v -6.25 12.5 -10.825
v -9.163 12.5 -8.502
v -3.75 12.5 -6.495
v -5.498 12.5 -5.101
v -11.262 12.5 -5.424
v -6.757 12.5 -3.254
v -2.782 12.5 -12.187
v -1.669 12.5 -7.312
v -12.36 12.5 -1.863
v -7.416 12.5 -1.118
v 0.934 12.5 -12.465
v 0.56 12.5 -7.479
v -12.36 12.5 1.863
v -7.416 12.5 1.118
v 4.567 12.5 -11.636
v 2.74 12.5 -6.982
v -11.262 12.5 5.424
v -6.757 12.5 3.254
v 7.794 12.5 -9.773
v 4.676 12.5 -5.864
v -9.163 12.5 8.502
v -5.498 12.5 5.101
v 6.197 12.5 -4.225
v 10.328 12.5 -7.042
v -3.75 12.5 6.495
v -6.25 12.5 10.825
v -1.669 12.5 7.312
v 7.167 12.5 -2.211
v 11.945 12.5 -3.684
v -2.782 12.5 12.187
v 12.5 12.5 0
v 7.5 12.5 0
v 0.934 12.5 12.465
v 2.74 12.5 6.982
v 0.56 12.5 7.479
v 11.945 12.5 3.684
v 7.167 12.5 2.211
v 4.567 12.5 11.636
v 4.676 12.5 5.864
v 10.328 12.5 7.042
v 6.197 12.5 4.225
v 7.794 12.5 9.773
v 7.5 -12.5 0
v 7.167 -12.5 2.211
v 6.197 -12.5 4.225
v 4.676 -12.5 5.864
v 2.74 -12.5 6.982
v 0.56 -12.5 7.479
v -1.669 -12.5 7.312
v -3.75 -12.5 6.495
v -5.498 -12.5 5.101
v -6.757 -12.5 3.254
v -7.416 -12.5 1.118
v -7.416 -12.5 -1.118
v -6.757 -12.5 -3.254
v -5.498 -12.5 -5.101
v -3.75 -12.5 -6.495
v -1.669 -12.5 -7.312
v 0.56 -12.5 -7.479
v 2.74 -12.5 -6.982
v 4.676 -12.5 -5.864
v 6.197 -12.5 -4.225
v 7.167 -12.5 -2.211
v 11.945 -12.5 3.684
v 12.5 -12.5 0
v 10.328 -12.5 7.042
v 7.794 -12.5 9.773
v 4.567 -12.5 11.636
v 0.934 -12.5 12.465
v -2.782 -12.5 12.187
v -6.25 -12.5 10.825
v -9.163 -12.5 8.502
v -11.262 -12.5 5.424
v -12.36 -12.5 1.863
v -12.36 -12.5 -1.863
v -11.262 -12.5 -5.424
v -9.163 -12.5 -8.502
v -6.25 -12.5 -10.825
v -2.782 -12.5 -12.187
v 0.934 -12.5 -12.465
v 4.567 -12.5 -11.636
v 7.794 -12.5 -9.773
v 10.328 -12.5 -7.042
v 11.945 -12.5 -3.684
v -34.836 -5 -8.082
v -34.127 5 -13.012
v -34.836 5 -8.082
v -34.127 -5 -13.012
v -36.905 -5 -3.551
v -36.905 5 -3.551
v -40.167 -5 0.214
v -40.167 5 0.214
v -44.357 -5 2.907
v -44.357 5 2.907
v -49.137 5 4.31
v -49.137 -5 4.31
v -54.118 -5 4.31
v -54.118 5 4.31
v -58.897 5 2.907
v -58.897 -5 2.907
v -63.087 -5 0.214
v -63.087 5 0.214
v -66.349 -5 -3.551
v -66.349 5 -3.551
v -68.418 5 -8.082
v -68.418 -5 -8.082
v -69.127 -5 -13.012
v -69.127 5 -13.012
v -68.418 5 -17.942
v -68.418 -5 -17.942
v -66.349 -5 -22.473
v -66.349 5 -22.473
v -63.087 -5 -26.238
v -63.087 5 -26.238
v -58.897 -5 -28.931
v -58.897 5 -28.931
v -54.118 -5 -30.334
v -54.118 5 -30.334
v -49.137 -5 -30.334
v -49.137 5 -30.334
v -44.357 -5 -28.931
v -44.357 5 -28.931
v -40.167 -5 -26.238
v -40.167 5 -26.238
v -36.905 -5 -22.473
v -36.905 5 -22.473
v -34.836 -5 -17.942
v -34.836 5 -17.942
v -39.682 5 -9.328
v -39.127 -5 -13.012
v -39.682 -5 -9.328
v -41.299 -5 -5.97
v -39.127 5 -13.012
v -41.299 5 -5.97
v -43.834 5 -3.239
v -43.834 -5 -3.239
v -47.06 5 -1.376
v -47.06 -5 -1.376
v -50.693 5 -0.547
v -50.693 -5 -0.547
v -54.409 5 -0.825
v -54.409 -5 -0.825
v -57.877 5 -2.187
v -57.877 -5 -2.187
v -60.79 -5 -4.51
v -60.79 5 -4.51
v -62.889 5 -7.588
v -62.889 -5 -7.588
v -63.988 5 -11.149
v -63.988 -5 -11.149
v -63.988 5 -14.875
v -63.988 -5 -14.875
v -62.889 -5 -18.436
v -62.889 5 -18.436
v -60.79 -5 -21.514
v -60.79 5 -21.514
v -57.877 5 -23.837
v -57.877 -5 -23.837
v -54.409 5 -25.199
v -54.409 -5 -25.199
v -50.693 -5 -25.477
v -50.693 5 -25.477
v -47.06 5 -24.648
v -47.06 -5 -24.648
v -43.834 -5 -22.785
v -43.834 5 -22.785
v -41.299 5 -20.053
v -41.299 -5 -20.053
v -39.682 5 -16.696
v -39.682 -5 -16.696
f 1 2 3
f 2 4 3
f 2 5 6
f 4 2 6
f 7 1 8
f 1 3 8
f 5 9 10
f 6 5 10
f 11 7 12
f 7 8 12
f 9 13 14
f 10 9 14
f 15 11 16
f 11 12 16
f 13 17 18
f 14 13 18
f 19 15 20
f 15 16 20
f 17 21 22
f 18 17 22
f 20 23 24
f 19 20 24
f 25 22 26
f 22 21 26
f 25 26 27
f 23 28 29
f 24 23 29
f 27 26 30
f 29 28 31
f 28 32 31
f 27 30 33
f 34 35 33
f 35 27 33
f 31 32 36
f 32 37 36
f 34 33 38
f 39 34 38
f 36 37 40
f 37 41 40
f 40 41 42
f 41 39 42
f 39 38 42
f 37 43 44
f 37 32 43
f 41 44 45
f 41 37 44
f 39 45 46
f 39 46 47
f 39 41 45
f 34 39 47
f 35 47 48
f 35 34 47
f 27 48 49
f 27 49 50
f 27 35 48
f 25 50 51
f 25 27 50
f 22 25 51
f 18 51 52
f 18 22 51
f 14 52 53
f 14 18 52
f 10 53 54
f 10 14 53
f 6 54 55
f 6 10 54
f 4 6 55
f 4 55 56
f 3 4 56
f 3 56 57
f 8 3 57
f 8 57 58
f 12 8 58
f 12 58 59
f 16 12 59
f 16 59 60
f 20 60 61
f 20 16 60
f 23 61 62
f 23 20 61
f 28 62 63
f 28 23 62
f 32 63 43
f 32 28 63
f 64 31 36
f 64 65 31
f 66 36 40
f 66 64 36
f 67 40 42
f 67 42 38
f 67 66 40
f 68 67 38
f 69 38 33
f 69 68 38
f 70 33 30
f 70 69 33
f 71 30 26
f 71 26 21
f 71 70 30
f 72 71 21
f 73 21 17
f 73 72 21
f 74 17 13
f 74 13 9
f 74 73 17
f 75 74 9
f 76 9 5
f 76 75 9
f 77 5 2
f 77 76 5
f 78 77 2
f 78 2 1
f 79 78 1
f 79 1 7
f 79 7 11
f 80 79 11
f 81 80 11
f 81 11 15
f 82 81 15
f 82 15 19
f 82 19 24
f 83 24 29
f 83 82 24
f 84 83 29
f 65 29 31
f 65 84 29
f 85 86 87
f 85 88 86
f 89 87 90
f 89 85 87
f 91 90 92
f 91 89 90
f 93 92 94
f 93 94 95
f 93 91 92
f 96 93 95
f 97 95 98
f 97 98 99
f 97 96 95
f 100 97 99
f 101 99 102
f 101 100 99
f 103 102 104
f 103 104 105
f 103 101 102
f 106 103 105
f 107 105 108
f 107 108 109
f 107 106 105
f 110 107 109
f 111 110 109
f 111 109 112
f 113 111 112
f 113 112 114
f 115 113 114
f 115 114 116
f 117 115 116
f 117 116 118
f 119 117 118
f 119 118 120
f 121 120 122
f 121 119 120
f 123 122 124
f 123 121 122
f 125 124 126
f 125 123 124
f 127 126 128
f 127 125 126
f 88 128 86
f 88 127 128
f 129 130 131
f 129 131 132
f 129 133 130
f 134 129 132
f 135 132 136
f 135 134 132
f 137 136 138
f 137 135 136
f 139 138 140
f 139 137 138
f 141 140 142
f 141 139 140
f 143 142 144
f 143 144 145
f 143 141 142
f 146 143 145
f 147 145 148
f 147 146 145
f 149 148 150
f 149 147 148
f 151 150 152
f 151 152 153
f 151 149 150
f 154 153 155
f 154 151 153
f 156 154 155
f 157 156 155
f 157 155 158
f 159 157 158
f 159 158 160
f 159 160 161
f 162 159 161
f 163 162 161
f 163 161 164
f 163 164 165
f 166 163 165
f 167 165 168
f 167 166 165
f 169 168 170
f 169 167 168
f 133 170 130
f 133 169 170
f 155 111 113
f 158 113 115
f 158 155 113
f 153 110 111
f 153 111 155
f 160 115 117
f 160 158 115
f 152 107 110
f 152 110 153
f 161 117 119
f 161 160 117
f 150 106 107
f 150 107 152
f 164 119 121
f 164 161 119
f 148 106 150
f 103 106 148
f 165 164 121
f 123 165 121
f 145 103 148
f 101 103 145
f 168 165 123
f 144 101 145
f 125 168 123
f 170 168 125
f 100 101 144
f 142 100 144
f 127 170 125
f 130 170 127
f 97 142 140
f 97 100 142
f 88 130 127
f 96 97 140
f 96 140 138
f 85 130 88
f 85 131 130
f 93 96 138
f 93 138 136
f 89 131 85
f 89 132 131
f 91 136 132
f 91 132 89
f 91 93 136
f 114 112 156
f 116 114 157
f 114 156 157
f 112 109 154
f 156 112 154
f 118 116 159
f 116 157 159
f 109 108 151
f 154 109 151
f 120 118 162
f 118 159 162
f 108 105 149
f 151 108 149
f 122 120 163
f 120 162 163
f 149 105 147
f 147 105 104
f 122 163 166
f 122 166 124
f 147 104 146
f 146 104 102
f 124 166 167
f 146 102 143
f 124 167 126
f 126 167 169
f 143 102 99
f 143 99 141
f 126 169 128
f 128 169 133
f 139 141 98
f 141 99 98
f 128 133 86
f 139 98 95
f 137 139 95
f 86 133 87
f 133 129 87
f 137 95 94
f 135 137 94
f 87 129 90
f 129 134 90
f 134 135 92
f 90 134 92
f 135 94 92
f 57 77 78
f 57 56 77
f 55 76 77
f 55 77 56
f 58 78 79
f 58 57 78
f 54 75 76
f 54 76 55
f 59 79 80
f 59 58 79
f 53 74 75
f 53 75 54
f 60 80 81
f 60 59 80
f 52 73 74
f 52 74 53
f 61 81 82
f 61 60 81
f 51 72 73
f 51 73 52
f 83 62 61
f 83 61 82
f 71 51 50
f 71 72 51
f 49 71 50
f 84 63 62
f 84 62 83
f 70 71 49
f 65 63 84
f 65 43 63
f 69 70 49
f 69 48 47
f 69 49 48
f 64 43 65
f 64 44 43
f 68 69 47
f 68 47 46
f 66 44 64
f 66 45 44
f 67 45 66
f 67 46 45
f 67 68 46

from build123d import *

# Parameters (mm, degrees)
F0_R     = 12.5
F0_R_2   = 7.5
F1_DEPTH = 12.5
F2_R     = 17.5
F2_R_2   = 12.5
F3_DEPTH = 5


with BuildPart() as f1:
    # F0 (on Front) → F1 (new body, symmetric)
    with BuildSketch(Plane.XZ):
        Circle(F0_R)
        Circle(F0_R_2, mode=Mode.SUBTRACT)
    extrude(amount=F1_DEPTH, both=True)


with BuildPart() as f3:
    # F2 (on Front) → F3 (new body, symmetric)
    with BuildSketch(Plane.XZ):
        with Locations((-51.627144, -13.011978)):
            Circle(F2_R)
        with Locations((-51.627144, -13.011978)):
            Circle(F2_R_2, mode=Mode.SUBTRACT)
    extrude(amount=F3_DEPTH, both=True)


solid = Compound([f1.part, f3.part])
